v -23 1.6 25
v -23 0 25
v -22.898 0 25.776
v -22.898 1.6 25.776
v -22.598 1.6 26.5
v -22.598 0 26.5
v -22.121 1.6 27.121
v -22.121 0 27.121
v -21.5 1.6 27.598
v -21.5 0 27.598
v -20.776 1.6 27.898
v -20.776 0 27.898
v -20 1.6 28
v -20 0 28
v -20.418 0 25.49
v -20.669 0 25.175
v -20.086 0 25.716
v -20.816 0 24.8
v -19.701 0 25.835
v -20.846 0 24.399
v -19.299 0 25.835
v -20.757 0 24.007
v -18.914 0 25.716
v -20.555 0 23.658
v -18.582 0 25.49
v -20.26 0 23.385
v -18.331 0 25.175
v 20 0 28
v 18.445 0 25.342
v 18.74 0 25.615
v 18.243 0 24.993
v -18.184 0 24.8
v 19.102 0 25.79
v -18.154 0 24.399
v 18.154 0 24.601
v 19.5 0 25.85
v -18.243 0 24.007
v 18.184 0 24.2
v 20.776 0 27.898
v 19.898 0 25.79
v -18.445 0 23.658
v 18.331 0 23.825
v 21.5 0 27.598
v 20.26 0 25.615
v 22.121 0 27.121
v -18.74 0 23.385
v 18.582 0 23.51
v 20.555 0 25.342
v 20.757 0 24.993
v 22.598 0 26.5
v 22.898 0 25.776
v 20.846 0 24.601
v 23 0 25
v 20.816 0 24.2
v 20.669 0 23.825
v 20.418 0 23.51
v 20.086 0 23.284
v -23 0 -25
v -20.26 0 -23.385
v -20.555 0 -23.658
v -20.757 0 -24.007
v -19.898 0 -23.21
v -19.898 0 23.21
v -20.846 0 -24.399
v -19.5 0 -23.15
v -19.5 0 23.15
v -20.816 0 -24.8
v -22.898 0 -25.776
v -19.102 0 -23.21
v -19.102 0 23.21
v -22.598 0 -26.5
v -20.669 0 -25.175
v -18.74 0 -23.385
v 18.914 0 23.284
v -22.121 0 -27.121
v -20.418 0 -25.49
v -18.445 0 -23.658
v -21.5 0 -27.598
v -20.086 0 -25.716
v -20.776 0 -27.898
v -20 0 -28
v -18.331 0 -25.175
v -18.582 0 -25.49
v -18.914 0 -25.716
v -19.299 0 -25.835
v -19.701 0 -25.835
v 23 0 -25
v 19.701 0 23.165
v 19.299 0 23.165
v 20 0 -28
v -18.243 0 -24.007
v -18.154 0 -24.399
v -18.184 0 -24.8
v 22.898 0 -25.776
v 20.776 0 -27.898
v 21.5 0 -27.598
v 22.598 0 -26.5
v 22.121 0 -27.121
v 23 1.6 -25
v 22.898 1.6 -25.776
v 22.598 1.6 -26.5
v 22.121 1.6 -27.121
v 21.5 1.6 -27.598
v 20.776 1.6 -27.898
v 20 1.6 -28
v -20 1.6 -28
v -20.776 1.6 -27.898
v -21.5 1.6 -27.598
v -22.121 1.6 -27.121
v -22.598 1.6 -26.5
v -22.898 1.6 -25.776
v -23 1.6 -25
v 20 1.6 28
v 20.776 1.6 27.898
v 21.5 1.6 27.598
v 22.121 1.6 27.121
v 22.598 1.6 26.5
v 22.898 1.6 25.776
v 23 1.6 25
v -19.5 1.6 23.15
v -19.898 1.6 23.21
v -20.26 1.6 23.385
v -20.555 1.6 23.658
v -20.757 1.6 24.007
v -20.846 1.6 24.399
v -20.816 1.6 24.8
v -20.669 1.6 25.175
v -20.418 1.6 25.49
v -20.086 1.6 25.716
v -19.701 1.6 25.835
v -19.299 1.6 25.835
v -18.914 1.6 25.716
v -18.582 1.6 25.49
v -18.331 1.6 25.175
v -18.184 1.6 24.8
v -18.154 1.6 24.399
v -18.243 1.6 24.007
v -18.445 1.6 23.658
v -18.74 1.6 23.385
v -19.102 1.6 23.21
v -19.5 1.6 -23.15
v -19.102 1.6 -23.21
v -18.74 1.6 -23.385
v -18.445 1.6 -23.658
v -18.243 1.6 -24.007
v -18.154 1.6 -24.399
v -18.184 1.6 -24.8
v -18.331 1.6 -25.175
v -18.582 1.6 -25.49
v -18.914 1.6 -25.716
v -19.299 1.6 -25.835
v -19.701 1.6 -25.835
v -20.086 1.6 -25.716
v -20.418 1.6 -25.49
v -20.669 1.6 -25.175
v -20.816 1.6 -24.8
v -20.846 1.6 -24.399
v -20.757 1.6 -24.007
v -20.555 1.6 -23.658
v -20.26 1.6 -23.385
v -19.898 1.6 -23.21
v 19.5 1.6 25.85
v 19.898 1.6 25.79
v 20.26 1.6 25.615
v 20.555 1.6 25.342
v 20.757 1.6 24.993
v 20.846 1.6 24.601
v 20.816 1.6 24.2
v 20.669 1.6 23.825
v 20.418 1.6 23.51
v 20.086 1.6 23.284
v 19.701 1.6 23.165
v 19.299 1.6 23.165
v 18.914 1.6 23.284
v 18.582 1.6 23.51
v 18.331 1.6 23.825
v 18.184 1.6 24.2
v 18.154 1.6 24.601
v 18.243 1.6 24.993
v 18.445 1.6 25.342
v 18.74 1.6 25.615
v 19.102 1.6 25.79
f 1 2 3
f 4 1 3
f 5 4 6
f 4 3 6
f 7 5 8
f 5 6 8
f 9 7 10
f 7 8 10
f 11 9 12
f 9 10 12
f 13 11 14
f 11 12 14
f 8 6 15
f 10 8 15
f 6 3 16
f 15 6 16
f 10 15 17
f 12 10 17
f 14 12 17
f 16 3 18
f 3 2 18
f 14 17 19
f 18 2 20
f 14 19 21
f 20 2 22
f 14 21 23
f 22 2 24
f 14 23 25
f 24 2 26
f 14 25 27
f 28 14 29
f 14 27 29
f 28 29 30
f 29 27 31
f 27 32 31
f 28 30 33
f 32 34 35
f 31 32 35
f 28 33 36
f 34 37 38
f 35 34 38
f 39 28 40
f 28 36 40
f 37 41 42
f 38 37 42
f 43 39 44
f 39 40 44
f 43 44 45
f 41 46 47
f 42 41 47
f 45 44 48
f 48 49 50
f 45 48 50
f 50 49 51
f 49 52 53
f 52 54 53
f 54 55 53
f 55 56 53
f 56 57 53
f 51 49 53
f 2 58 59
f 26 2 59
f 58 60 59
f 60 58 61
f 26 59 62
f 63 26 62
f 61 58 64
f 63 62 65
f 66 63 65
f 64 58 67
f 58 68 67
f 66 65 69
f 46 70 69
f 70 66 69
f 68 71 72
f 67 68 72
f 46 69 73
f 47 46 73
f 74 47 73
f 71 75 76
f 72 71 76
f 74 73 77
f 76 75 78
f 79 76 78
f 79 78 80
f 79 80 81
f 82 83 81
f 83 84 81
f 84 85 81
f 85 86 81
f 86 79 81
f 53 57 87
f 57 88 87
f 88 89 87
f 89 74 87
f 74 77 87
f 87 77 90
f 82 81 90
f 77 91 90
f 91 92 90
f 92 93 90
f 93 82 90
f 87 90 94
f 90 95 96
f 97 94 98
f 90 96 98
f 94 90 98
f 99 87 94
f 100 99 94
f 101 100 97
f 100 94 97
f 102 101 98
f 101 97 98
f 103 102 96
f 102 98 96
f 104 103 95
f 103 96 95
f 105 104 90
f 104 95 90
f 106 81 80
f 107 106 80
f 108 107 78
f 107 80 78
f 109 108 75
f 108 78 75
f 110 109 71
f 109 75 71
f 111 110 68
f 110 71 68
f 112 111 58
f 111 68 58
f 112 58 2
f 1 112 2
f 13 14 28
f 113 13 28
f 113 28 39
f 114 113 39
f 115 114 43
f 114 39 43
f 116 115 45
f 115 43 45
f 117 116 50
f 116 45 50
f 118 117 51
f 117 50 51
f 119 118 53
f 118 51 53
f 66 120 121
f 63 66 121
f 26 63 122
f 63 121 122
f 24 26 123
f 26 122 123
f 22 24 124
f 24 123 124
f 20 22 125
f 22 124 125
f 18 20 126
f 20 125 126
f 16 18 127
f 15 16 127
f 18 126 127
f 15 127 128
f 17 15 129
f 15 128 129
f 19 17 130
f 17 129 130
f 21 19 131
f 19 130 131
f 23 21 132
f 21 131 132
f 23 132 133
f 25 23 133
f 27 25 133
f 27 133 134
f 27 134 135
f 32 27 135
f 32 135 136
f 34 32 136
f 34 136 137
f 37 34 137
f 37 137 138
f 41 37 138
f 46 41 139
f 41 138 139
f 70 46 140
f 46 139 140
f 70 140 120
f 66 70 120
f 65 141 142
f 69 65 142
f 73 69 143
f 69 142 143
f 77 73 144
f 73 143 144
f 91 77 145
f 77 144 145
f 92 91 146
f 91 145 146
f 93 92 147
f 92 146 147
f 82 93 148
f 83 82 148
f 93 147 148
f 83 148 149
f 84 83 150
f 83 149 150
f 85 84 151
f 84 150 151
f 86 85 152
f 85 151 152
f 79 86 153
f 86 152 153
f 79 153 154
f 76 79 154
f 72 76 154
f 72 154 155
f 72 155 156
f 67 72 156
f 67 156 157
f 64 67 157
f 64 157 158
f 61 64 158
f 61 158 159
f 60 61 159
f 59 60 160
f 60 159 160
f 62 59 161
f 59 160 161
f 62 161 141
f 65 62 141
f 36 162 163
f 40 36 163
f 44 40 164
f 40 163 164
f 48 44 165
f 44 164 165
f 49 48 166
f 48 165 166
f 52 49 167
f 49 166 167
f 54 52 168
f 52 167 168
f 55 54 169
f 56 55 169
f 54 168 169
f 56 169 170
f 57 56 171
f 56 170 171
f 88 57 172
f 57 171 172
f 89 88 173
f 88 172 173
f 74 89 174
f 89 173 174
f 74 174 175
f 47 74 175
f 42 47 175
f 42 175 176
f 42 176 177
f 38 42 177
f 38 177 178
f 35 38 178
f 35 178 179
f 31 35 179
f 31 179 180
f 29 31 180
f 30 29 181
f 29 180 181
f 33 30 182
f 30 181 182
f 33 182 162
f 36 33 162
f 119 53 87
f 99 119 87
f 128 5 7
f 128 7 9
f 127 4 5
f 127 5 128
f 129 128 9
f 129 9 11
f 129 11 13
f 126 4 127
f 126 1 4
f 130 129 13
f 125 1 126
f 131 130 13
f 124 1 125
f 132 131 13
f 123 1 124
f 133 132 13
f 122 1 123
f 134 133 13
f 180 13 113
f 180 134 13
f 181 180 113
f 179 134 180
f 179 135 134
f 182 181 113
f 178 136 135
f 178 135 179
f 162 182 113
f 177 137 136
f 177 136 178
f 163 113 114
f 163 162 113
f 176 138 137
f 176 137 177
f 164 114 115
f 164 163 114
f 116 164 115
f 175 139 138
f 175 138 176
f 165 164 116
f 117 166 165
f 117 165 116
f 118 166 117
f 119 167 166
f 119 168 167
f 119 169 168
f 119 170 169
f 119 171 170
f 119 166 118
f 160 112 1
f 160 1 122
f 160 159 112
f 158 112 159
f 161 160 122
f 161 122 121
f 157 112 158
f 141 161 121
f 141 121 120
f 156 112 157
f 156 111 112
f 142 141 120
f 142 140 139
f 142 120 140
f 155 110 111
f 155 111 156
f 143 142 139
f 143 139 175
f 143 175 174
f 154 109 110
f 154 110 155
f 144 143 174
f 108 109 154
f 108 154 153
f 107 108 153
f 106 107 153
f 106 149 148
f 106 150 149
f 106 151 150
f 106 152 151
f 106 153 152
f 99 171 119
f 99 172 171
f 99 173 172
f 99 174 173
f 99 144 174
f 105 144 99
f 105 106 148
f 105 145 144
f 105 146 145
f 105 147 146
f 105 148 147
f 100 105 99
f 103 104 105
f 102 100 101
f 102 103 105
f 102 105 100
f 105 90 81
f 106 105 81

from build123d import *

# Parameters (mm, degrees)
Y_KSEKLIK_EKSTR_ZYON1_DEPTH = 1.6
IZIM2_R                     = 1.35
KES_EKSTR_ZYON1_DEPTH       = 1.6


with BuildPart() as part:
    # Çizim1 → Yükseklik-Ekstrüzyon1 (new body)
    with BuildSketch(Plane(origin=(0, 0, 0), x_dir=(1, 0, 0), z_dir=(0, 1, 0))):
        with BuildLine():
            Line((-20, -28), (20, -28))
            ThreePointArc((20, -28), (22.121320344, -27.121320344), (23, -25))
            Line((23, -25), (23, 25))
            ThreePointArc((23, 25), (22.121320344, 27.121320344), (20, 28))
            Line((20, 28), (-20, 28))
            ThreePointArc((-20, 28), (-22.121320344, 27.121320344), (-23, 25))
            Line((-23, 25), (-23, -25))
            ThreePointArc((-23, -25), (-22.121320344, -27.121320344), (-20, -28))
        make_face()
    extrude(amount=Y_KSEKLIK_EKSTR_ZYON1_DEPTH)

    # Çizim2 → Kes-Ekstrüzyon1 (cut)
    with BuildSketch(Plane(origin=(0, 1.6, 0), x_dir=(1, 0, 0), z_dir=(0, 1, 0))):
        with Locations(Location((-19.5, 24.5, 0), (0, 0, 270))):
            Circle(IZIM2_R)
        with Locations(Location((19.5, -24.5, 0), (0, 0, 270))):
            Circle(IZIM2_R)
        with Locations(Location((-19.5, -24.5, 0), (0, 0, 90))):
            Circle(IZIM2_R)
    extrude(amount=-KES_EKSTR_ZYON1_DEPTH, mode=Mode.SUBTRACT)


solid = part.part
